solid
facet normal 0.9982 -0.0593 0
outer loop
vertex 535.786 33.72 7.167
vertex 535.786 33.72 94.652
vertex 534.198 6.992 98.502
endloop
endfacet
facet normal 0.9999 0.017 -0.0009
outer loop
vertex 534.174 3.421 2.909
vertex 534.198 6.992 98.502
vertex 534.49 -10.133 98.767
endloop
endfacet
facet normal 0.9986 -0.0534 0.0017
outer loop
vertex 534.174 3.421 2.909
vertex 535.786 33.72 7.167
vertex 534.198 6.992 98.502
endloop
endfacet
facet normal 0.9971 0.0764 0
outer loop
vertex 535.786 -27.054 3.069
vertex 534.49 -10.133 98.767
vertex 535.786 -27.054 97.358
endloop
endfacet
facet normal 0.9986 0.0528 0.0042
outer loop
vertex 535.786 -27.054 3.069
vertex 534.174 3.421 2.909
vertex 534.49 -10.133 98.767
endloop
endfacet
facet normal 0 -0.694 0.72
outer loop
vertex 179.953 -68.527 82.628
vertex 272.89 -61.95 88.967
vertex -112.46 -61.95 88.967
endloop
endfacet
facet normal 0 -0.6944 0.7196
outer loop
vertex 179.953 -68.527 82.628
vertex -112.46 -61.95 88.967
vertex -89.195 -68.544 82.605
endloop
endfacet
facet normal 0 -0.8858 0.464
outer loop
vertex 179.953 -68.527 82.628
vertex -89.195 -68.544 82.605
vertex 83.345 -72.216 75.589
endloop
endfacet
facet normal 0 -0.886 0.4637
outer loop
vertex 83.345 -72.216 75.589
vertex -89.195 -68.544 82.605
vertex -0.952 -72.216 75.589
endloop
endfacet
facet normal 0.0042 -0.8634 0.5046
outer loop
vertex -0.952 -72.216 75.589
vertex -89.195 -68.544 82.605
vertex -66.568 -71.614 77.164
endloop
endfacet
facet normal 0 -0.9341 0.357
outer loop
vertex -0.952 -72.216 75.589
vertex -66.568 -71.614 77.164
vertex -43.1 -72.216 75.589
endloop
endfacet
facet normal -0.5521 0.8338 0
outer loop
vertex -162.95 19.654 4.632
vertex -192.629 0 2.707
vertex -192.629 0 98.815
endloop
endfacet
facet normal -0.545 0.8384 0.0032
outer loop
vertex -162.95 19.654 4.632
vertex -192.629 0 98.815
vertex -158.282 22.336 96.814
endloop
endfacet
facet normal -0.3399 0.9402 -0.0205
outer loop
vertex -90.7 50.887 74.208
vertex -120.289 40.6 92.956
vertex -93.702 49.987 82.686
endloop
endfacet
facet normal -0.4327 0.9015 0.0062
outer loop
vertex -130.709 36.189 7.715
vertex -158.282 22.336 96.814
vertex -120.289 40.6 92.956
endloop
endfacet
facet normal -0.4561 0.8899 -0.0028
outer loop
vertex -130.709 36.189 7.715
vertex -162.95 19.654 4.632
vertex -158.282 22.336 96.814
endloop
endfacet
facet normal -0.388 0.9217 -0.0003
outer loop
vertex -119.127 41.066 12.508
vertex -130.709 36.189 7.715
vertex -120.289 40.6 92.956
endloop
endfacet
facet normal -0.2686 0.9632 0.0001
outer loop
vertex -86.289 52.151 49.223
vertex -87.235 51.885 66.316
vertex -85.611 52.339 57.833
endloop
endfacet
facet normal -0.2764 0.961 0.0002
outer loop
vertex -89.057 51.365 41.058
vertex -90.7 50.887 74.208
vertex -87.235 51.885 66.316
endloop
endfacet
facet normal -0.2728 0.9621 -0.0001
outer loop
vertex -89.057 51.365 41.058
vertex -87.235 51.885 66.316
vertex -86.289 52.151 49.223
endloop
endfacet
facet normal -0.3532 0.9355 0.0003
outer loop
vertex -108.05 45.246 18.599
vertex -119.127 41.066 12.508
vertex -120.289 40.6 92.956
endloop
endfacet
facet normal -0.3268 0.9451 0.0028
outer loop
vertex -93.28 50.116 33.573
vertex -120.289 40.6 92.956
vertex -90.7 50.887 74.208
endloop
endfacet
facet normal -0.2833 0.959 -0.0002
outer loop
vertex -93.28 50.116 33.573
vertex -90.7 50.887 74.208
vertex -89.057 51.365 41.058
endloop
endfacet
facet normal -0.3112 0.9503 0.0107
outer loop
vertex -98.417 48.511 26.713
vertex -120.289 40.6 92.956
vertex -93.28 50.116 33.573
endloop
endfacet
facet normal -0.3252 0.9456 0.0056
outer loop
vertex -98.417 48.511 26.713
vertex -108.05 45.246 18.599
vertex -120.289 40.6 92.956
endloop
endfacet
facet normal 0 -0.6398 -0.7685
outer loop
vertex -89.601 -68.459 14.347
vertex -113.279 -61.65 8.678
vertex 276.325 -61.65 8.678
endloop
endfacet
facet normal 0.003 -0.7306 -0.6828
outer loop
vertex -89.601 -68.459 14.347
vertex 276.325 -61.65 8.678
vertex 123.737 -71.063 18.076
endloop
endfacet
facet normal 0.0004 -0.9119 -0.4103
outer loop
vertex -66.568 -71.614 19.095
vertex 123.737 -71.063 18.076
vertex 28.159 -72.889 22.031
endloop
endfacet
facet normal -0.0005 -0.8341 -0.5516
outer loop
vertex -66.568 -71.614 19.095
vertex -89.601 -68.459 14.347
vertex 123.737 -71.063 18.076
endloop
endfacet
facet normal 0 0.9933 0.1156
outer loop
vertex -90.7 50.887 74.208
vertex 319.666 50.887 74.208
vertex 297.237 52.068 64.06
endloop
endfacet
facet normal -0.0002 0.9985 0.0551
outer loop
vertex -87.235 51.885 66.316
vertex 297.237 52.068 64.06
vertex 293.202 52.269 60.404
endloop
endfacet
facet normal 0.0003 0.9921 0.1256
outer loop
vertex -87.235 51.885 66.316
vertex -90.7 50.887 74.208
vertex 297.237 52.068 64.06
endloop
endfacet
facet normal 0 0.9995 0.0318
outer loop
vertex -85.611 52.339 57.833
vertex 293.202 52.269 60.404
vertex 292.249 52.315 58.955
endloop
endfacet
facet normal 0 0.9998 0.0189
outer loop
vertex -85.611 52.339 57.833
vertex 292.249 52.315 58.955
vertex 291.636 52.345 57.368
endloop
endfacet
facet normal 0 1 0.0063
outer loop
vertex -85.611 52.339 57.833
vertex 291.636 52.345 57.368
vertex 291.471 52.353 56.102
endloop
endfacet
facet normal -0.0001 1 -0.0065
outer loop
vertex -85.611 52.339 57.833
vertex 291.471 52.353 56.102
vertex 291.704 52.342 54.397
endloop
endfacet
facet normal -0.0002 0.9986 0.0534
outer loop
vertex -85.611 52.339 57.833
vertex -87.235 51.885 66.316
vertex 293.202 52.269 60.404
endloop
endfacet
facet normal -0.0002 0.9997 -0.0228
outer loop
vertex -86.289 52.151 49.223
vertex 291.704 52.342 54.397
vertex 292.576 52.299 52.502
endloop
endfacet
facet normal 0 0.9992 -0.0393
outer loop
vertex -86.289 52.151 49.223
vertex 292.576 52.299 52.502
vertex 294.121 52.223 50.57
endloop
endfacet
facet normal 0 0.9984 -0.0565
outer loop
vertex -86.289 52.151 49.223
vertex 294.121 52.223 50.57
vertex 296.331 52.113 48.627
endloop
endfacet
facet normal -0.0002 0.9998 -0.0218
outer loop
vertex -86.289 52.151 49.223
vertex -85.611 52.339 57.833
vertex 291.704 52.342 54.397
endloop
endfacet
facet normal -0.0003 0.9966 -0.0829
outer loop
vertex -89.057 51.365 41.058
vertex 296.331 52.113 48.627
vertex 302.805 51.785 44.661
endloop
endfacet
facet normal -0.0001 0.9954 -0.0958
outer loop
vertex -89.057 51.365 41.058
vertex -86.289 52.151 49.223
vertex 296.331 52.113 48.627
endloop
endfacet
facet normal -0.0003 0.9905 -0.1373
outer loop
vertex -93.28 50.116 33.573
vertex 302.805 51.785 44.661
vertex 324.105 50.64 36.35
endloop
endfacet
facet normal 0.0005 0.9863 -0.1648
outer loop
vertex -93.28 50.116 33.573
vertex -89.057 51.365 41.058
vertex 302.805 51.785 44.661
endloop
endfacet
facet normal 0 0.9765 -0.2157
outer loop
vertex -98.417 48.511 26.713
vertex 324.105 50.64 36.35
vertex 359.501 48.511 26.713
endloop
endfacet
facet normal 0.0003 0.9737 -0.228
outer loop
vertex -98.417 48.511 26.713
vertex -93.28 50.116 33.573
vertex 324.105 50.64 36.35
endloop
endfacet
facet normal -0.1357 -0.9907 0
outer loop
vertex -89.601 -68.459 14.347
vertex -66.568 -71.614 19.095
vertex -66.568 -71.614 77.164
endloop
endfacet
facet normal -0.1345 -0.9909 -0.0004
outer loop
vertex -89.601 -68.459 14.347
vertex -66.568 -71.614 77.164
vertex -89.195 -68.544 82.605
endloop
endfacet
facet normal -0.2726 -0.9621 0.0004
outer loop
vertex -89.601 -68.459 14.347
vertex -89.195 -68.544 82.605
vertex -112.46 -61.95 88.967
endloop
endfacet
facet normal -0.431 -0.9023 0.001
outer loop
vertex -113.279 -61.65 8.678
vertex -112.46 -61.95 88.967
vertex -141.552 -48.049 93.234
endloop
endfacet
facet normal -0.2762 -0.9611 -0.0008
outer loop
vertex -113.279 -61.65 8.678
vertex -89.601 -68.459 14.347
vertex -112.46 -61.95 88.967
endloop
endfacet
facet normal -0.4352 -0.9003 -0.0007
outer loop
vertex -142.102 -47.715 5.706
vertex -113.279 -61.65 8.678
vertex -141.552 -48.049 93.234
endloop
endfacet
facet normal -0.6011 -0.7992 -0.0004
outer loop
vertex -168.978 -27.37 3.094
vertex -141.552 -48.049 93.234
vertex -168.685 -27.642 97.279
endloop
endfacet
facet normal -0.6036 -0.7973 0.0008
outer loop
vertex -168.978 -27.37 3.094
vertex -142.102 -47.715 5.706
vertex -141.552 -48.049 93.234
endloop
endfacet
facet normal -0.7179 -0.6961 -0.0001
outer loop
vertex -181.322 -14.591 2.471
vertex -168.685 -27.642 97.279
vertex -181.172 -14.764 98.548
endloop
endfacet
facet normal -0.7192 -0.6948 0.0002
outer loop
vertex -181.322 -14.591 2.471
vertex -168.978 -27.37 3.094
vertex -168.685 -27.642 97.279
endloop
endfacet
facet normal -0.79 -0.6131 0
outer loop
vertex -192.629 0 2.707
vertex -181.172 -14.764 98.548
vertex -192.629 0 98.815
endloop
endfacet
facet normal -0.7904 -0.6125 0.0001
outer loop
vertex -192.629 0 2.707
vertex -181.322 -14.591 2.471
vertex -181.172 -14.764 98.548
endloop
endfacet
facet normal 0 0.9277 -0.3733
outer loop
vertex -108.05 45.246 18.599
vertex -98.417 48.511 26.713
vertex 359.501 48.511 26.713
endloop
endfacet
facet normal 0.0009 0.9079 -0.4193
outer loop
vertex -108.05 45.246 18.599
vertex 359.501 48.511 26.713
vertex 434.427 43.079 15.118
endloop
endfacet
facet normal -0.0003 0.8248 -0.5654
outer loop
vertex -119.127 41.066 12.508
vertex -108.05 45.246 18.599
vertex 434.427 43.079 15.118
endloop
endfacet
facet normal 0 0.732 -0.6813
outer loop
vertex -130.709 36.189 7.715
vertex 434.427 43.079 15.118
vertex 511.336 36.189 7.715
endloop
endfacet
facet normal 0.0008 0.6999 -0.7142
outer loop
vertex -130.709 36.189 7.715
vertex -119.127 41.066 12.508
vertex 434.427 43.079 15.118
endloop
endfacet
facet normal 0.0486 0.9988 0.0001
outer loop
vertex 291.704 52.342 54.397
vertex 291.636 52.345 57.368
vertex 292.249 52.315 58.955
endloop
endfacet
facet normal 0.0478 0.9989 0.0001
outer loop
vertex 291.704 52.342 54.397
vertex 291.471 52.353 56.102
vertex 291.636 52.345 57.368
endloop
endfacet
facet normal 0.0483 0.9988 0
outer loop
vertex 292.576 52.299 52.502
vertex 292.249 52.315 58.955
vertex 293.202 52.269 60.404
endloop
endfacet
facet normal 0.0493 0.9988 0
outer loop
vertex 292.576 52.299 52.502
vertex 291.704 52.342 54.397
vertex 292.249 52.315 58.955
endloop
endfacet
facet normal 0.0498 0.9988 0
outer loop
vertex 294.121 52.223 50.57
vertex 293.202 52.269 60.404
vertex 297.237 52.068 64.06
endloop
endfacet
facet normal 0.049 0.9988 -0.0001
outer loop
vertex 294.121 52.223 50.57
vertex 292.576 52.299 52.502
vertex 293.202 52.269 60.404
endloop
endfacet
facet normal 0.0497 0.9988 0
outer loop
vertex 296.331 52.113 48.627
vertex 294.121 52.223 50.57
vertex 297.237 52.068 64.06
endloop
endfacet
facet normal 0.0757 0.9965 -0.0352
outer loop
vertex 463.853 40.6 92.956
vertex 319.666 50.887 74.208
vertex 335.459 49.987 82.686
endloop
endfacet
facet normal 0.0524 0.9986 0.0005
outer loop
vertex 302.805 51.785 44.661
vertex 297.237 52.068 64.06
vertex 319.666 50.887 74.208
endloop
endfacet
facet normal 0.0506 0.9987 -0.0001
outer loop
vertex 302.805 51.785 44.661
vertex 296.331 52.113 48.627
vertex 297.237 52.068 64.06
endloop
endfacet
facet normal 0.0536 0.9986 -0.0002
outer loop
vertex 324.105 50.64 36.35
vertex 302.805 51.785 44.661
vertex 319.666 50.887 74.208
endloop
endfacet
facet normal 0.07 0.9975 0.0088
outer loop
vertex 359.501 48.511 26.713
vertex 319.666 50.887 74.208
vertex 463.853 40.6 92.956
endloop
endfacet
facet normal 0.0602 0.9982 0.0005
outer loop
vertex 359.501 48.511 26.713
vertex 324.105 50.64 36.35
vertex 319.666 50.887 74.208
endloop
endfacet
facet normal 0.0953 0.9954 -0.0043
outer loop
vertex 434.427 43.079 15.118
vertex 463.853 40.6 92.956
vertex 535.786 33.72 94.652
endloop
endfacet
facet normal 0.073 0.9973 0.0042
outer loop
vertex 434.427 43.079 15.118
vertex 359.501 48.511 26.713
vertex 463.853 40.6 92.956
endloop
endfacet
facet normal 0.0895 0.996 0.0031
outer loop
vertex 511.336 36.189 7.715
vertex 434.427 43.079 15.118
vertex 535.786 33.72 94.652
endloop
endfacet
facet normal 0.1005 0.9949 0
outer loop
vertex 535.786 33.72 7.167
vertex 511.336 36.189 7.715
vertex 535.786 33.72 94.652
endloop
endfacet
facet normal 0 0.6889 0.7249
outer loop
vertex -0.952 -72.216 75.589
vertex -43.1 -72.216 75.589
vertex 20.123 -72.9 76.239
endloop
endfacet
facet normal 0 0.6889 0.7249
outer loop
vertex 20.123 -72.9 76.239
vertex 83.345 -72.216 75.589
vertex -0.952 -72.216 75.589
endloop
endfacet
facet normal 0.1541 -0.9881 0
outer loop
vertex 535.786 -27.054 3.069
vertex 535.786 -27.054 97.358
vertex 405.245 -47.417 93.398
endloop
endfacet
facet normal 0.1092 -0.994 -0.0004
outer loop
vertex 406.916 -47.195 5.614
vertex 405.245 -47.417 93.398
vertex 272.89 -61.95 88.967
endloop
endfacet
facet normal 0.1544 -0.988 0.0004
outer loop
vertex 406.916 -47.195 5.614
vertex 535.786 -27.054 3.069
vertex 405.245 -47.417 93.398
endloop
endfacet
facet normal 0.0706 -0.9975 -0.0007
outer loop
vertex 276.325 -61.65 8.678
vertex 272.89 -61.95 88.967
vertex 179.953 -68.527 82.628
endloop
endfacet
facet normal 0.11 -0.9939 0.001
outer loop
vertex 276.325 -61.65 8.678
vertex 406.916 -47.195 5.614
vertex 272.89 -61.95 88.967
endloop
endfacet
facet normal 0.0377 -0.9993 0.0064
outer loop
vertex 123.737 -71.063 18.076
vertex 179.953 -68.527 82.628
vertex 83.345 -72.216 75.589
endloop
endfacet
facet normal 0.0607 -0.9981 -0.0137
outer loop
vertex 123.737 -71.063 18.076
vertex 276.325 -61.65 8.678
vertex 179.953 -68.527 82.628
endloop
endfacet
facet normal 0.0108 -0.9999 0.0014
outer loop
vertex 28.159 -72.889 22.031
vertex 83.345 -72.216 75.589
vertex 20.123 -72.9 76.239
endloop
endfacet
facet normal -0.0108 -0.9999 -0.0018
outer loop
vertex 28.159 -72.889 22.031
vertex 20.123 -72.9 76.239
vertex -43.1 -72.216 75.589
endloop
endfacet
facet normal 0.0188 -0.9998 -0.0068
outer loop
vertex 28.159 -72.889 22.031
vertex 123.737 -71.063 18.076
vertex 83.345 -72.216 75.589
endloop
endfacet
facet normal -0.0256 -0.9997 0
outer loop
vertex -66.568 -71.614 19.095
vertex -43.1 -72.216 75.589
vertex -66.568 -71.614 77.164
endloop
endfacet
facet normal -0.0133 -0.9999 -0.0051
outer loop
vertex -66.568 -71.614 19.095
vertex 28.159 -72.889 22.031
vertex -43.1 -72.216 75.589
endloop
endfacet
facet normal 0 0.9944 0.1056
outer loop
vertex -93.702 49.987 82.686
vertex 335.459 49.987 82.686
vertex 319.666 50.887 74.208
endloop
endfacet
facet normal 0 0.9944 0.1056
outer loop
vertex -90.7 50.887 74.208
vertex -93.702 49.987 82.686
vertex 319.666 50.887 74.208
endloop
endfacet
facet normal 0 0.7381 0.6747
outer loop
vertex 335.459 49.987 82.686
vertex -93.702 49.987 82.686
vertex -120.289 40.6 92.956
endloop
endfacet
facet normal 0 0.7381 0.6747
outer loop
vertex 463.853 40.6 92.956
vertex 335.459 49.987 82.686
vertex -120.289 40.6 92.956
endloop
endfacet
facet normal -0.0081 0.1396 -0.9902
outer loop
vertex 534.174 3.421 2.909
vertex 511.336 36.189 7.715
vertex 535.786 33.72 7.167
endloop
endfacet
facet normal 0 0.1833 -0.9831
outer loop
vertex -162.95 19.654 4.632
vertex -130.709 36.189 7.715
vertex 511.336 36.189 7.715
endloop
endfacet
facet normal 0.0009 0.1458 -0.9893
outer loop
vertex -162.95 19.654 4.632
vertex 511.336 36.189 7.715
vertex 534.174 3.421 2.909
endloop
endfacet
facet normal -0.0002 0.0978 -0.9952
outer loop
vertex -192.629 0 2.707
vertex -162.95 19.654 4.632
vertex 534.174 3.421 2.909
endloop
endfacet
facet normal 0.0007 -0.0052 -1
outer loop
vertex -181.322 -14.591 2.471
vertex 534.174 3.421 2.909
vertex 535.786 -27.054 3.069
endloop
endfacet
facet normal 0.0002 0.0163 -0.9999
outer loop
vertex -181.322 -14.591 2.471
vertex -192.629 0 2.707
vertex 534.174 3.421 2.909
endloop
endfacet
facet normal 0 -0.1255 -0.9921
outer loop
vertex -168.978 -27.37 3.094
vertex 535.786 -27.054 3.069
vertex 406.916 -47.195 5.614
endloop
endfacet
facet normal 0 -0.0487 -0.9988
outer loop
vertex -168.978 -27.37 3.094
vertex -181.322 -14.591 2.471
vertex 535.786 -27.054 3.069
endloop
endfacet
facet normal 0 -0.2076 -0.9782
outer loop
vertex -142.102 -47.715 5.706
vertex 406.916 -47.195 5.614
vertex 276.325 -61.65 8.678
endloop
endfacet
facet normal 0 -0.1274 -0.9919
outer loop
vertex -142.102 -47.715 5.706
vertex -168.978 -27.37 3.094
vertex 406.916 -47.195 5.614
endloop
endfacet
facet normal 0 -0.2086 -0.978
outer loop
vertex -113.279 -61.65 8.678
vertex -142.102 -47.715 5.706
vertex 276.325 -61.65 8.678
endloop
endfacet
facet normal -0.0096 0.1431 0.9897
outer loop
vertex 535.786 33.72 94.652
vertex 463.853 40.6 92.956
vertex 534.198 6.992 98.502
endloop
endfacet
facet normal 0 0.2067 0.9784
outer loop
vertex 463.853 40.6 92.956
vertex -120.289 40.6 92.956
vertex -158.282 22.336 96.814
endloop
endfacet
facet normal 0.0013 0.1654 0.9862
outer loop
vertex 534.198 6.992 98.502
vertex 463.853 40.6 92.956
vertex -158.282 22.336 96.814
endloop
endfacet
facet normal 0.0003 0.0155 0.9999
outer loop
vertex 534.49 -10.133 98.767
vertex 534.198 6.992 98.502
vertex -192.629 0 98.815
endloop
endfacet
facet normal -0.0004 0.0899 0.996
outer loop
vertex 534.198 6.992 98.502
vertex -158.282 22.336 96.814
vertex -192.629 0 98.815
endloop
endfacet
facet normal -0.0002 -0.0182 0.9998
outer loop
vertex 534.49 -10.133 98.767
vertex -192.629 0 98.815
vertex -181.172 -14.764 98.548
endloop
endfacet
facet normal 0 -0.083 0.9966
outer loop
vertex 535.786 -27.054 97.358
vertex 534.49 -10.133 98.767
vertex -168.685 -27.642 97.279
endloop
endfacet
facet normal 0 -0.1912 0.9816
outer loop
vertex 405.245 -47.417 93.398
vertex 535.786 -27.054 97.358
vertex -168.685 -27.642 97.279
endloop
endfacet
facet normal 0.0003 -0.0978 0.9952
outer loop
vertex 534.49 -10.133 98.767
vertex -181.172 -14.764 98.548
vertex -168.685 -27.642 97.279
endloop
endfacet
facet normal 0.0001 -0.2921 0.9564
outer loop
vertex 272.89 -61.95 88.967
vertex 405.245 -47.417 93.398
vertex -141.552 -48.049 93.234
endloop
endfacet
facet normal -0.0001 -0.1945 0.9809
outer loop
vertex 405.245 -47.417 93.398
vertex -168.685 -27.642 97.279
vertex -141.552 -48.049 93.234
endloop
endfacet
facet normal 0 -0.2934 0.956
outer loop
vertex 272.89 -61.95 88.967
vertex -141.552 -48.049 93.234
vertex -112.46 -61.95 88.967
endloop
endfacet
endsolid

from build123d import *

# Parameters (mm, degrees)
BOSS_EXTRUDE1_DEPTH     = 100
CUT_EXTRUDE3_DEPTH      = 550.891405391
CUT_EXTRUDE3_DEPTH_BACK = 550.891405391
CUT_EXTRUDE5_DEPTH      = 550.686535404
CUT_EXTRUDE5_DEPTH_BACK = 550.686535404


with BuildPart() as part:
    # Sketch1 → Boss-Extrude1 (new body)
    with BuildSketch(Plane.XY):
        with BuildLine():
            ThreePointArc((-192.629438793, 0), (-136.135725272, 33.719619965), (-73.991525193, 55.321722514))
            ThreePointArc((-73.991525193, 55.321722514), (231.264395529, 54.89097703), (535.785554592, 33.719619965))
            ThreePointArc((535.785554592, 33.719619965), (534.174229279, 3.332708678), (535.785554592, -27.054202608))
            ThreePointArc((535.785554592, -27.054202608), (235.762691459, -64.934671976), (-66.568309368, -71.614065728))
            ThreePointArc((-66.568309368, -71.614065728), (-137.800866021, -50.244872094), (-192.629438793, 0))
        make_face()
    extrude(amount=BOSS_EXTRUDE1_DEPTH)

    # Sketch2 → Cut-Extrude3 (cut, two sides: drawn at the far end of the back side and taken through both)
    with BuildSketch(Plane(origin=(0, 0, 0), x_dir=(0, 0, -1), z_dir=(1, 0, 0)).offset(-CUT_EXTRUDE3_DEPTH_BACK)):
        with BuildLine():
            ThreePointArc((-65.447202994, 54.830423707), (-80.892507985, 50.983746932), (-92.956496986, 40.600368972))
            ThreePointArc((-92.956496986, 40.600368972), (-98.736407831, -10.977338679), (-88.967303886, -61.950193259))
            ThreePointArc((-88.967303886, -61.950193259), (-83.10915251, -68.165990231), (-75.589128758, -72.216090516))
            ThreePointArc((-75.589128758, -72.216090516), (-123.822815089, -94.064788666), (-173.378544397, -75.407784602))
            ThreePointArc((-173.378544397, -75.407784602), (-163.802190068, -4.583325871), (-135.262897635, 60.940099743))
            ThreePointArc((-135.262897635, 60.940099743), (-100.366866686, 80.430667917), (-61.326949176, 89.003885783))
            ThreePointArc((-61.326949176, 89.003885783), (-63.560434952, 71.938056418), (-65.447202994, 54.830423707))
        make_face()
    extrude(amount=CUT_EXTRUDE3_DEPTH + CUT_EXTRUDE3_DEPTH_BACK, mode=Mode.SUBTRACT)

    # Sketch3 → Cut-Extrude5 (cut, two sides: drawn at the far end of the back side and taken through both)
    with BuildSketch(Plane(origin=(0, 0, 0), x_dir=(0, 0, -1), z_dir=(1, 0, 0)).offset(-CUT_EXTRUDE5_DEPTH_BACK)):
        with BuildLine():
            ThreePointArc((-74.208303325, 50.886642831), (-50.335012976, 52.211638999), (-26.713093985, 48.511024166))
            ThreePointArc((-26.713093985, 48.511024166), (-16.247111553, 43.841102683), (-7.714956491, 36.189482926))
            ThreePointArc((-7.714956491, 36.189482926), (-2.445034952, -12.786836037), (-8.678058045, -61.649923489))
            ThreePointArc((-8.678058045, -61.649923489), (-17.453523943, -70.69509128), (-29.511303704, -74.360307413))
            ThreePointArc((-29.511303704, -74.360307413), (33.955140221, -79.826327987), (85.286434054, -42.104117568))
            ThreePointArc((85.286434054, -42.104117568), (41.180066923, 16.064388488), (12.319514625, 83.116720583))
            ThreePointArc((12.319514625, 83.116720583), (-170.558095104, 441.821406771), (-74.208303325, 50.886642831))
        make_face()
    extrude(amount=CUT_EXTRUDE5_DEPTH + CUT_EXTRUDE5_DEPTH_BACK, mode=Mode.SUBTRACT)


solid = part.part
